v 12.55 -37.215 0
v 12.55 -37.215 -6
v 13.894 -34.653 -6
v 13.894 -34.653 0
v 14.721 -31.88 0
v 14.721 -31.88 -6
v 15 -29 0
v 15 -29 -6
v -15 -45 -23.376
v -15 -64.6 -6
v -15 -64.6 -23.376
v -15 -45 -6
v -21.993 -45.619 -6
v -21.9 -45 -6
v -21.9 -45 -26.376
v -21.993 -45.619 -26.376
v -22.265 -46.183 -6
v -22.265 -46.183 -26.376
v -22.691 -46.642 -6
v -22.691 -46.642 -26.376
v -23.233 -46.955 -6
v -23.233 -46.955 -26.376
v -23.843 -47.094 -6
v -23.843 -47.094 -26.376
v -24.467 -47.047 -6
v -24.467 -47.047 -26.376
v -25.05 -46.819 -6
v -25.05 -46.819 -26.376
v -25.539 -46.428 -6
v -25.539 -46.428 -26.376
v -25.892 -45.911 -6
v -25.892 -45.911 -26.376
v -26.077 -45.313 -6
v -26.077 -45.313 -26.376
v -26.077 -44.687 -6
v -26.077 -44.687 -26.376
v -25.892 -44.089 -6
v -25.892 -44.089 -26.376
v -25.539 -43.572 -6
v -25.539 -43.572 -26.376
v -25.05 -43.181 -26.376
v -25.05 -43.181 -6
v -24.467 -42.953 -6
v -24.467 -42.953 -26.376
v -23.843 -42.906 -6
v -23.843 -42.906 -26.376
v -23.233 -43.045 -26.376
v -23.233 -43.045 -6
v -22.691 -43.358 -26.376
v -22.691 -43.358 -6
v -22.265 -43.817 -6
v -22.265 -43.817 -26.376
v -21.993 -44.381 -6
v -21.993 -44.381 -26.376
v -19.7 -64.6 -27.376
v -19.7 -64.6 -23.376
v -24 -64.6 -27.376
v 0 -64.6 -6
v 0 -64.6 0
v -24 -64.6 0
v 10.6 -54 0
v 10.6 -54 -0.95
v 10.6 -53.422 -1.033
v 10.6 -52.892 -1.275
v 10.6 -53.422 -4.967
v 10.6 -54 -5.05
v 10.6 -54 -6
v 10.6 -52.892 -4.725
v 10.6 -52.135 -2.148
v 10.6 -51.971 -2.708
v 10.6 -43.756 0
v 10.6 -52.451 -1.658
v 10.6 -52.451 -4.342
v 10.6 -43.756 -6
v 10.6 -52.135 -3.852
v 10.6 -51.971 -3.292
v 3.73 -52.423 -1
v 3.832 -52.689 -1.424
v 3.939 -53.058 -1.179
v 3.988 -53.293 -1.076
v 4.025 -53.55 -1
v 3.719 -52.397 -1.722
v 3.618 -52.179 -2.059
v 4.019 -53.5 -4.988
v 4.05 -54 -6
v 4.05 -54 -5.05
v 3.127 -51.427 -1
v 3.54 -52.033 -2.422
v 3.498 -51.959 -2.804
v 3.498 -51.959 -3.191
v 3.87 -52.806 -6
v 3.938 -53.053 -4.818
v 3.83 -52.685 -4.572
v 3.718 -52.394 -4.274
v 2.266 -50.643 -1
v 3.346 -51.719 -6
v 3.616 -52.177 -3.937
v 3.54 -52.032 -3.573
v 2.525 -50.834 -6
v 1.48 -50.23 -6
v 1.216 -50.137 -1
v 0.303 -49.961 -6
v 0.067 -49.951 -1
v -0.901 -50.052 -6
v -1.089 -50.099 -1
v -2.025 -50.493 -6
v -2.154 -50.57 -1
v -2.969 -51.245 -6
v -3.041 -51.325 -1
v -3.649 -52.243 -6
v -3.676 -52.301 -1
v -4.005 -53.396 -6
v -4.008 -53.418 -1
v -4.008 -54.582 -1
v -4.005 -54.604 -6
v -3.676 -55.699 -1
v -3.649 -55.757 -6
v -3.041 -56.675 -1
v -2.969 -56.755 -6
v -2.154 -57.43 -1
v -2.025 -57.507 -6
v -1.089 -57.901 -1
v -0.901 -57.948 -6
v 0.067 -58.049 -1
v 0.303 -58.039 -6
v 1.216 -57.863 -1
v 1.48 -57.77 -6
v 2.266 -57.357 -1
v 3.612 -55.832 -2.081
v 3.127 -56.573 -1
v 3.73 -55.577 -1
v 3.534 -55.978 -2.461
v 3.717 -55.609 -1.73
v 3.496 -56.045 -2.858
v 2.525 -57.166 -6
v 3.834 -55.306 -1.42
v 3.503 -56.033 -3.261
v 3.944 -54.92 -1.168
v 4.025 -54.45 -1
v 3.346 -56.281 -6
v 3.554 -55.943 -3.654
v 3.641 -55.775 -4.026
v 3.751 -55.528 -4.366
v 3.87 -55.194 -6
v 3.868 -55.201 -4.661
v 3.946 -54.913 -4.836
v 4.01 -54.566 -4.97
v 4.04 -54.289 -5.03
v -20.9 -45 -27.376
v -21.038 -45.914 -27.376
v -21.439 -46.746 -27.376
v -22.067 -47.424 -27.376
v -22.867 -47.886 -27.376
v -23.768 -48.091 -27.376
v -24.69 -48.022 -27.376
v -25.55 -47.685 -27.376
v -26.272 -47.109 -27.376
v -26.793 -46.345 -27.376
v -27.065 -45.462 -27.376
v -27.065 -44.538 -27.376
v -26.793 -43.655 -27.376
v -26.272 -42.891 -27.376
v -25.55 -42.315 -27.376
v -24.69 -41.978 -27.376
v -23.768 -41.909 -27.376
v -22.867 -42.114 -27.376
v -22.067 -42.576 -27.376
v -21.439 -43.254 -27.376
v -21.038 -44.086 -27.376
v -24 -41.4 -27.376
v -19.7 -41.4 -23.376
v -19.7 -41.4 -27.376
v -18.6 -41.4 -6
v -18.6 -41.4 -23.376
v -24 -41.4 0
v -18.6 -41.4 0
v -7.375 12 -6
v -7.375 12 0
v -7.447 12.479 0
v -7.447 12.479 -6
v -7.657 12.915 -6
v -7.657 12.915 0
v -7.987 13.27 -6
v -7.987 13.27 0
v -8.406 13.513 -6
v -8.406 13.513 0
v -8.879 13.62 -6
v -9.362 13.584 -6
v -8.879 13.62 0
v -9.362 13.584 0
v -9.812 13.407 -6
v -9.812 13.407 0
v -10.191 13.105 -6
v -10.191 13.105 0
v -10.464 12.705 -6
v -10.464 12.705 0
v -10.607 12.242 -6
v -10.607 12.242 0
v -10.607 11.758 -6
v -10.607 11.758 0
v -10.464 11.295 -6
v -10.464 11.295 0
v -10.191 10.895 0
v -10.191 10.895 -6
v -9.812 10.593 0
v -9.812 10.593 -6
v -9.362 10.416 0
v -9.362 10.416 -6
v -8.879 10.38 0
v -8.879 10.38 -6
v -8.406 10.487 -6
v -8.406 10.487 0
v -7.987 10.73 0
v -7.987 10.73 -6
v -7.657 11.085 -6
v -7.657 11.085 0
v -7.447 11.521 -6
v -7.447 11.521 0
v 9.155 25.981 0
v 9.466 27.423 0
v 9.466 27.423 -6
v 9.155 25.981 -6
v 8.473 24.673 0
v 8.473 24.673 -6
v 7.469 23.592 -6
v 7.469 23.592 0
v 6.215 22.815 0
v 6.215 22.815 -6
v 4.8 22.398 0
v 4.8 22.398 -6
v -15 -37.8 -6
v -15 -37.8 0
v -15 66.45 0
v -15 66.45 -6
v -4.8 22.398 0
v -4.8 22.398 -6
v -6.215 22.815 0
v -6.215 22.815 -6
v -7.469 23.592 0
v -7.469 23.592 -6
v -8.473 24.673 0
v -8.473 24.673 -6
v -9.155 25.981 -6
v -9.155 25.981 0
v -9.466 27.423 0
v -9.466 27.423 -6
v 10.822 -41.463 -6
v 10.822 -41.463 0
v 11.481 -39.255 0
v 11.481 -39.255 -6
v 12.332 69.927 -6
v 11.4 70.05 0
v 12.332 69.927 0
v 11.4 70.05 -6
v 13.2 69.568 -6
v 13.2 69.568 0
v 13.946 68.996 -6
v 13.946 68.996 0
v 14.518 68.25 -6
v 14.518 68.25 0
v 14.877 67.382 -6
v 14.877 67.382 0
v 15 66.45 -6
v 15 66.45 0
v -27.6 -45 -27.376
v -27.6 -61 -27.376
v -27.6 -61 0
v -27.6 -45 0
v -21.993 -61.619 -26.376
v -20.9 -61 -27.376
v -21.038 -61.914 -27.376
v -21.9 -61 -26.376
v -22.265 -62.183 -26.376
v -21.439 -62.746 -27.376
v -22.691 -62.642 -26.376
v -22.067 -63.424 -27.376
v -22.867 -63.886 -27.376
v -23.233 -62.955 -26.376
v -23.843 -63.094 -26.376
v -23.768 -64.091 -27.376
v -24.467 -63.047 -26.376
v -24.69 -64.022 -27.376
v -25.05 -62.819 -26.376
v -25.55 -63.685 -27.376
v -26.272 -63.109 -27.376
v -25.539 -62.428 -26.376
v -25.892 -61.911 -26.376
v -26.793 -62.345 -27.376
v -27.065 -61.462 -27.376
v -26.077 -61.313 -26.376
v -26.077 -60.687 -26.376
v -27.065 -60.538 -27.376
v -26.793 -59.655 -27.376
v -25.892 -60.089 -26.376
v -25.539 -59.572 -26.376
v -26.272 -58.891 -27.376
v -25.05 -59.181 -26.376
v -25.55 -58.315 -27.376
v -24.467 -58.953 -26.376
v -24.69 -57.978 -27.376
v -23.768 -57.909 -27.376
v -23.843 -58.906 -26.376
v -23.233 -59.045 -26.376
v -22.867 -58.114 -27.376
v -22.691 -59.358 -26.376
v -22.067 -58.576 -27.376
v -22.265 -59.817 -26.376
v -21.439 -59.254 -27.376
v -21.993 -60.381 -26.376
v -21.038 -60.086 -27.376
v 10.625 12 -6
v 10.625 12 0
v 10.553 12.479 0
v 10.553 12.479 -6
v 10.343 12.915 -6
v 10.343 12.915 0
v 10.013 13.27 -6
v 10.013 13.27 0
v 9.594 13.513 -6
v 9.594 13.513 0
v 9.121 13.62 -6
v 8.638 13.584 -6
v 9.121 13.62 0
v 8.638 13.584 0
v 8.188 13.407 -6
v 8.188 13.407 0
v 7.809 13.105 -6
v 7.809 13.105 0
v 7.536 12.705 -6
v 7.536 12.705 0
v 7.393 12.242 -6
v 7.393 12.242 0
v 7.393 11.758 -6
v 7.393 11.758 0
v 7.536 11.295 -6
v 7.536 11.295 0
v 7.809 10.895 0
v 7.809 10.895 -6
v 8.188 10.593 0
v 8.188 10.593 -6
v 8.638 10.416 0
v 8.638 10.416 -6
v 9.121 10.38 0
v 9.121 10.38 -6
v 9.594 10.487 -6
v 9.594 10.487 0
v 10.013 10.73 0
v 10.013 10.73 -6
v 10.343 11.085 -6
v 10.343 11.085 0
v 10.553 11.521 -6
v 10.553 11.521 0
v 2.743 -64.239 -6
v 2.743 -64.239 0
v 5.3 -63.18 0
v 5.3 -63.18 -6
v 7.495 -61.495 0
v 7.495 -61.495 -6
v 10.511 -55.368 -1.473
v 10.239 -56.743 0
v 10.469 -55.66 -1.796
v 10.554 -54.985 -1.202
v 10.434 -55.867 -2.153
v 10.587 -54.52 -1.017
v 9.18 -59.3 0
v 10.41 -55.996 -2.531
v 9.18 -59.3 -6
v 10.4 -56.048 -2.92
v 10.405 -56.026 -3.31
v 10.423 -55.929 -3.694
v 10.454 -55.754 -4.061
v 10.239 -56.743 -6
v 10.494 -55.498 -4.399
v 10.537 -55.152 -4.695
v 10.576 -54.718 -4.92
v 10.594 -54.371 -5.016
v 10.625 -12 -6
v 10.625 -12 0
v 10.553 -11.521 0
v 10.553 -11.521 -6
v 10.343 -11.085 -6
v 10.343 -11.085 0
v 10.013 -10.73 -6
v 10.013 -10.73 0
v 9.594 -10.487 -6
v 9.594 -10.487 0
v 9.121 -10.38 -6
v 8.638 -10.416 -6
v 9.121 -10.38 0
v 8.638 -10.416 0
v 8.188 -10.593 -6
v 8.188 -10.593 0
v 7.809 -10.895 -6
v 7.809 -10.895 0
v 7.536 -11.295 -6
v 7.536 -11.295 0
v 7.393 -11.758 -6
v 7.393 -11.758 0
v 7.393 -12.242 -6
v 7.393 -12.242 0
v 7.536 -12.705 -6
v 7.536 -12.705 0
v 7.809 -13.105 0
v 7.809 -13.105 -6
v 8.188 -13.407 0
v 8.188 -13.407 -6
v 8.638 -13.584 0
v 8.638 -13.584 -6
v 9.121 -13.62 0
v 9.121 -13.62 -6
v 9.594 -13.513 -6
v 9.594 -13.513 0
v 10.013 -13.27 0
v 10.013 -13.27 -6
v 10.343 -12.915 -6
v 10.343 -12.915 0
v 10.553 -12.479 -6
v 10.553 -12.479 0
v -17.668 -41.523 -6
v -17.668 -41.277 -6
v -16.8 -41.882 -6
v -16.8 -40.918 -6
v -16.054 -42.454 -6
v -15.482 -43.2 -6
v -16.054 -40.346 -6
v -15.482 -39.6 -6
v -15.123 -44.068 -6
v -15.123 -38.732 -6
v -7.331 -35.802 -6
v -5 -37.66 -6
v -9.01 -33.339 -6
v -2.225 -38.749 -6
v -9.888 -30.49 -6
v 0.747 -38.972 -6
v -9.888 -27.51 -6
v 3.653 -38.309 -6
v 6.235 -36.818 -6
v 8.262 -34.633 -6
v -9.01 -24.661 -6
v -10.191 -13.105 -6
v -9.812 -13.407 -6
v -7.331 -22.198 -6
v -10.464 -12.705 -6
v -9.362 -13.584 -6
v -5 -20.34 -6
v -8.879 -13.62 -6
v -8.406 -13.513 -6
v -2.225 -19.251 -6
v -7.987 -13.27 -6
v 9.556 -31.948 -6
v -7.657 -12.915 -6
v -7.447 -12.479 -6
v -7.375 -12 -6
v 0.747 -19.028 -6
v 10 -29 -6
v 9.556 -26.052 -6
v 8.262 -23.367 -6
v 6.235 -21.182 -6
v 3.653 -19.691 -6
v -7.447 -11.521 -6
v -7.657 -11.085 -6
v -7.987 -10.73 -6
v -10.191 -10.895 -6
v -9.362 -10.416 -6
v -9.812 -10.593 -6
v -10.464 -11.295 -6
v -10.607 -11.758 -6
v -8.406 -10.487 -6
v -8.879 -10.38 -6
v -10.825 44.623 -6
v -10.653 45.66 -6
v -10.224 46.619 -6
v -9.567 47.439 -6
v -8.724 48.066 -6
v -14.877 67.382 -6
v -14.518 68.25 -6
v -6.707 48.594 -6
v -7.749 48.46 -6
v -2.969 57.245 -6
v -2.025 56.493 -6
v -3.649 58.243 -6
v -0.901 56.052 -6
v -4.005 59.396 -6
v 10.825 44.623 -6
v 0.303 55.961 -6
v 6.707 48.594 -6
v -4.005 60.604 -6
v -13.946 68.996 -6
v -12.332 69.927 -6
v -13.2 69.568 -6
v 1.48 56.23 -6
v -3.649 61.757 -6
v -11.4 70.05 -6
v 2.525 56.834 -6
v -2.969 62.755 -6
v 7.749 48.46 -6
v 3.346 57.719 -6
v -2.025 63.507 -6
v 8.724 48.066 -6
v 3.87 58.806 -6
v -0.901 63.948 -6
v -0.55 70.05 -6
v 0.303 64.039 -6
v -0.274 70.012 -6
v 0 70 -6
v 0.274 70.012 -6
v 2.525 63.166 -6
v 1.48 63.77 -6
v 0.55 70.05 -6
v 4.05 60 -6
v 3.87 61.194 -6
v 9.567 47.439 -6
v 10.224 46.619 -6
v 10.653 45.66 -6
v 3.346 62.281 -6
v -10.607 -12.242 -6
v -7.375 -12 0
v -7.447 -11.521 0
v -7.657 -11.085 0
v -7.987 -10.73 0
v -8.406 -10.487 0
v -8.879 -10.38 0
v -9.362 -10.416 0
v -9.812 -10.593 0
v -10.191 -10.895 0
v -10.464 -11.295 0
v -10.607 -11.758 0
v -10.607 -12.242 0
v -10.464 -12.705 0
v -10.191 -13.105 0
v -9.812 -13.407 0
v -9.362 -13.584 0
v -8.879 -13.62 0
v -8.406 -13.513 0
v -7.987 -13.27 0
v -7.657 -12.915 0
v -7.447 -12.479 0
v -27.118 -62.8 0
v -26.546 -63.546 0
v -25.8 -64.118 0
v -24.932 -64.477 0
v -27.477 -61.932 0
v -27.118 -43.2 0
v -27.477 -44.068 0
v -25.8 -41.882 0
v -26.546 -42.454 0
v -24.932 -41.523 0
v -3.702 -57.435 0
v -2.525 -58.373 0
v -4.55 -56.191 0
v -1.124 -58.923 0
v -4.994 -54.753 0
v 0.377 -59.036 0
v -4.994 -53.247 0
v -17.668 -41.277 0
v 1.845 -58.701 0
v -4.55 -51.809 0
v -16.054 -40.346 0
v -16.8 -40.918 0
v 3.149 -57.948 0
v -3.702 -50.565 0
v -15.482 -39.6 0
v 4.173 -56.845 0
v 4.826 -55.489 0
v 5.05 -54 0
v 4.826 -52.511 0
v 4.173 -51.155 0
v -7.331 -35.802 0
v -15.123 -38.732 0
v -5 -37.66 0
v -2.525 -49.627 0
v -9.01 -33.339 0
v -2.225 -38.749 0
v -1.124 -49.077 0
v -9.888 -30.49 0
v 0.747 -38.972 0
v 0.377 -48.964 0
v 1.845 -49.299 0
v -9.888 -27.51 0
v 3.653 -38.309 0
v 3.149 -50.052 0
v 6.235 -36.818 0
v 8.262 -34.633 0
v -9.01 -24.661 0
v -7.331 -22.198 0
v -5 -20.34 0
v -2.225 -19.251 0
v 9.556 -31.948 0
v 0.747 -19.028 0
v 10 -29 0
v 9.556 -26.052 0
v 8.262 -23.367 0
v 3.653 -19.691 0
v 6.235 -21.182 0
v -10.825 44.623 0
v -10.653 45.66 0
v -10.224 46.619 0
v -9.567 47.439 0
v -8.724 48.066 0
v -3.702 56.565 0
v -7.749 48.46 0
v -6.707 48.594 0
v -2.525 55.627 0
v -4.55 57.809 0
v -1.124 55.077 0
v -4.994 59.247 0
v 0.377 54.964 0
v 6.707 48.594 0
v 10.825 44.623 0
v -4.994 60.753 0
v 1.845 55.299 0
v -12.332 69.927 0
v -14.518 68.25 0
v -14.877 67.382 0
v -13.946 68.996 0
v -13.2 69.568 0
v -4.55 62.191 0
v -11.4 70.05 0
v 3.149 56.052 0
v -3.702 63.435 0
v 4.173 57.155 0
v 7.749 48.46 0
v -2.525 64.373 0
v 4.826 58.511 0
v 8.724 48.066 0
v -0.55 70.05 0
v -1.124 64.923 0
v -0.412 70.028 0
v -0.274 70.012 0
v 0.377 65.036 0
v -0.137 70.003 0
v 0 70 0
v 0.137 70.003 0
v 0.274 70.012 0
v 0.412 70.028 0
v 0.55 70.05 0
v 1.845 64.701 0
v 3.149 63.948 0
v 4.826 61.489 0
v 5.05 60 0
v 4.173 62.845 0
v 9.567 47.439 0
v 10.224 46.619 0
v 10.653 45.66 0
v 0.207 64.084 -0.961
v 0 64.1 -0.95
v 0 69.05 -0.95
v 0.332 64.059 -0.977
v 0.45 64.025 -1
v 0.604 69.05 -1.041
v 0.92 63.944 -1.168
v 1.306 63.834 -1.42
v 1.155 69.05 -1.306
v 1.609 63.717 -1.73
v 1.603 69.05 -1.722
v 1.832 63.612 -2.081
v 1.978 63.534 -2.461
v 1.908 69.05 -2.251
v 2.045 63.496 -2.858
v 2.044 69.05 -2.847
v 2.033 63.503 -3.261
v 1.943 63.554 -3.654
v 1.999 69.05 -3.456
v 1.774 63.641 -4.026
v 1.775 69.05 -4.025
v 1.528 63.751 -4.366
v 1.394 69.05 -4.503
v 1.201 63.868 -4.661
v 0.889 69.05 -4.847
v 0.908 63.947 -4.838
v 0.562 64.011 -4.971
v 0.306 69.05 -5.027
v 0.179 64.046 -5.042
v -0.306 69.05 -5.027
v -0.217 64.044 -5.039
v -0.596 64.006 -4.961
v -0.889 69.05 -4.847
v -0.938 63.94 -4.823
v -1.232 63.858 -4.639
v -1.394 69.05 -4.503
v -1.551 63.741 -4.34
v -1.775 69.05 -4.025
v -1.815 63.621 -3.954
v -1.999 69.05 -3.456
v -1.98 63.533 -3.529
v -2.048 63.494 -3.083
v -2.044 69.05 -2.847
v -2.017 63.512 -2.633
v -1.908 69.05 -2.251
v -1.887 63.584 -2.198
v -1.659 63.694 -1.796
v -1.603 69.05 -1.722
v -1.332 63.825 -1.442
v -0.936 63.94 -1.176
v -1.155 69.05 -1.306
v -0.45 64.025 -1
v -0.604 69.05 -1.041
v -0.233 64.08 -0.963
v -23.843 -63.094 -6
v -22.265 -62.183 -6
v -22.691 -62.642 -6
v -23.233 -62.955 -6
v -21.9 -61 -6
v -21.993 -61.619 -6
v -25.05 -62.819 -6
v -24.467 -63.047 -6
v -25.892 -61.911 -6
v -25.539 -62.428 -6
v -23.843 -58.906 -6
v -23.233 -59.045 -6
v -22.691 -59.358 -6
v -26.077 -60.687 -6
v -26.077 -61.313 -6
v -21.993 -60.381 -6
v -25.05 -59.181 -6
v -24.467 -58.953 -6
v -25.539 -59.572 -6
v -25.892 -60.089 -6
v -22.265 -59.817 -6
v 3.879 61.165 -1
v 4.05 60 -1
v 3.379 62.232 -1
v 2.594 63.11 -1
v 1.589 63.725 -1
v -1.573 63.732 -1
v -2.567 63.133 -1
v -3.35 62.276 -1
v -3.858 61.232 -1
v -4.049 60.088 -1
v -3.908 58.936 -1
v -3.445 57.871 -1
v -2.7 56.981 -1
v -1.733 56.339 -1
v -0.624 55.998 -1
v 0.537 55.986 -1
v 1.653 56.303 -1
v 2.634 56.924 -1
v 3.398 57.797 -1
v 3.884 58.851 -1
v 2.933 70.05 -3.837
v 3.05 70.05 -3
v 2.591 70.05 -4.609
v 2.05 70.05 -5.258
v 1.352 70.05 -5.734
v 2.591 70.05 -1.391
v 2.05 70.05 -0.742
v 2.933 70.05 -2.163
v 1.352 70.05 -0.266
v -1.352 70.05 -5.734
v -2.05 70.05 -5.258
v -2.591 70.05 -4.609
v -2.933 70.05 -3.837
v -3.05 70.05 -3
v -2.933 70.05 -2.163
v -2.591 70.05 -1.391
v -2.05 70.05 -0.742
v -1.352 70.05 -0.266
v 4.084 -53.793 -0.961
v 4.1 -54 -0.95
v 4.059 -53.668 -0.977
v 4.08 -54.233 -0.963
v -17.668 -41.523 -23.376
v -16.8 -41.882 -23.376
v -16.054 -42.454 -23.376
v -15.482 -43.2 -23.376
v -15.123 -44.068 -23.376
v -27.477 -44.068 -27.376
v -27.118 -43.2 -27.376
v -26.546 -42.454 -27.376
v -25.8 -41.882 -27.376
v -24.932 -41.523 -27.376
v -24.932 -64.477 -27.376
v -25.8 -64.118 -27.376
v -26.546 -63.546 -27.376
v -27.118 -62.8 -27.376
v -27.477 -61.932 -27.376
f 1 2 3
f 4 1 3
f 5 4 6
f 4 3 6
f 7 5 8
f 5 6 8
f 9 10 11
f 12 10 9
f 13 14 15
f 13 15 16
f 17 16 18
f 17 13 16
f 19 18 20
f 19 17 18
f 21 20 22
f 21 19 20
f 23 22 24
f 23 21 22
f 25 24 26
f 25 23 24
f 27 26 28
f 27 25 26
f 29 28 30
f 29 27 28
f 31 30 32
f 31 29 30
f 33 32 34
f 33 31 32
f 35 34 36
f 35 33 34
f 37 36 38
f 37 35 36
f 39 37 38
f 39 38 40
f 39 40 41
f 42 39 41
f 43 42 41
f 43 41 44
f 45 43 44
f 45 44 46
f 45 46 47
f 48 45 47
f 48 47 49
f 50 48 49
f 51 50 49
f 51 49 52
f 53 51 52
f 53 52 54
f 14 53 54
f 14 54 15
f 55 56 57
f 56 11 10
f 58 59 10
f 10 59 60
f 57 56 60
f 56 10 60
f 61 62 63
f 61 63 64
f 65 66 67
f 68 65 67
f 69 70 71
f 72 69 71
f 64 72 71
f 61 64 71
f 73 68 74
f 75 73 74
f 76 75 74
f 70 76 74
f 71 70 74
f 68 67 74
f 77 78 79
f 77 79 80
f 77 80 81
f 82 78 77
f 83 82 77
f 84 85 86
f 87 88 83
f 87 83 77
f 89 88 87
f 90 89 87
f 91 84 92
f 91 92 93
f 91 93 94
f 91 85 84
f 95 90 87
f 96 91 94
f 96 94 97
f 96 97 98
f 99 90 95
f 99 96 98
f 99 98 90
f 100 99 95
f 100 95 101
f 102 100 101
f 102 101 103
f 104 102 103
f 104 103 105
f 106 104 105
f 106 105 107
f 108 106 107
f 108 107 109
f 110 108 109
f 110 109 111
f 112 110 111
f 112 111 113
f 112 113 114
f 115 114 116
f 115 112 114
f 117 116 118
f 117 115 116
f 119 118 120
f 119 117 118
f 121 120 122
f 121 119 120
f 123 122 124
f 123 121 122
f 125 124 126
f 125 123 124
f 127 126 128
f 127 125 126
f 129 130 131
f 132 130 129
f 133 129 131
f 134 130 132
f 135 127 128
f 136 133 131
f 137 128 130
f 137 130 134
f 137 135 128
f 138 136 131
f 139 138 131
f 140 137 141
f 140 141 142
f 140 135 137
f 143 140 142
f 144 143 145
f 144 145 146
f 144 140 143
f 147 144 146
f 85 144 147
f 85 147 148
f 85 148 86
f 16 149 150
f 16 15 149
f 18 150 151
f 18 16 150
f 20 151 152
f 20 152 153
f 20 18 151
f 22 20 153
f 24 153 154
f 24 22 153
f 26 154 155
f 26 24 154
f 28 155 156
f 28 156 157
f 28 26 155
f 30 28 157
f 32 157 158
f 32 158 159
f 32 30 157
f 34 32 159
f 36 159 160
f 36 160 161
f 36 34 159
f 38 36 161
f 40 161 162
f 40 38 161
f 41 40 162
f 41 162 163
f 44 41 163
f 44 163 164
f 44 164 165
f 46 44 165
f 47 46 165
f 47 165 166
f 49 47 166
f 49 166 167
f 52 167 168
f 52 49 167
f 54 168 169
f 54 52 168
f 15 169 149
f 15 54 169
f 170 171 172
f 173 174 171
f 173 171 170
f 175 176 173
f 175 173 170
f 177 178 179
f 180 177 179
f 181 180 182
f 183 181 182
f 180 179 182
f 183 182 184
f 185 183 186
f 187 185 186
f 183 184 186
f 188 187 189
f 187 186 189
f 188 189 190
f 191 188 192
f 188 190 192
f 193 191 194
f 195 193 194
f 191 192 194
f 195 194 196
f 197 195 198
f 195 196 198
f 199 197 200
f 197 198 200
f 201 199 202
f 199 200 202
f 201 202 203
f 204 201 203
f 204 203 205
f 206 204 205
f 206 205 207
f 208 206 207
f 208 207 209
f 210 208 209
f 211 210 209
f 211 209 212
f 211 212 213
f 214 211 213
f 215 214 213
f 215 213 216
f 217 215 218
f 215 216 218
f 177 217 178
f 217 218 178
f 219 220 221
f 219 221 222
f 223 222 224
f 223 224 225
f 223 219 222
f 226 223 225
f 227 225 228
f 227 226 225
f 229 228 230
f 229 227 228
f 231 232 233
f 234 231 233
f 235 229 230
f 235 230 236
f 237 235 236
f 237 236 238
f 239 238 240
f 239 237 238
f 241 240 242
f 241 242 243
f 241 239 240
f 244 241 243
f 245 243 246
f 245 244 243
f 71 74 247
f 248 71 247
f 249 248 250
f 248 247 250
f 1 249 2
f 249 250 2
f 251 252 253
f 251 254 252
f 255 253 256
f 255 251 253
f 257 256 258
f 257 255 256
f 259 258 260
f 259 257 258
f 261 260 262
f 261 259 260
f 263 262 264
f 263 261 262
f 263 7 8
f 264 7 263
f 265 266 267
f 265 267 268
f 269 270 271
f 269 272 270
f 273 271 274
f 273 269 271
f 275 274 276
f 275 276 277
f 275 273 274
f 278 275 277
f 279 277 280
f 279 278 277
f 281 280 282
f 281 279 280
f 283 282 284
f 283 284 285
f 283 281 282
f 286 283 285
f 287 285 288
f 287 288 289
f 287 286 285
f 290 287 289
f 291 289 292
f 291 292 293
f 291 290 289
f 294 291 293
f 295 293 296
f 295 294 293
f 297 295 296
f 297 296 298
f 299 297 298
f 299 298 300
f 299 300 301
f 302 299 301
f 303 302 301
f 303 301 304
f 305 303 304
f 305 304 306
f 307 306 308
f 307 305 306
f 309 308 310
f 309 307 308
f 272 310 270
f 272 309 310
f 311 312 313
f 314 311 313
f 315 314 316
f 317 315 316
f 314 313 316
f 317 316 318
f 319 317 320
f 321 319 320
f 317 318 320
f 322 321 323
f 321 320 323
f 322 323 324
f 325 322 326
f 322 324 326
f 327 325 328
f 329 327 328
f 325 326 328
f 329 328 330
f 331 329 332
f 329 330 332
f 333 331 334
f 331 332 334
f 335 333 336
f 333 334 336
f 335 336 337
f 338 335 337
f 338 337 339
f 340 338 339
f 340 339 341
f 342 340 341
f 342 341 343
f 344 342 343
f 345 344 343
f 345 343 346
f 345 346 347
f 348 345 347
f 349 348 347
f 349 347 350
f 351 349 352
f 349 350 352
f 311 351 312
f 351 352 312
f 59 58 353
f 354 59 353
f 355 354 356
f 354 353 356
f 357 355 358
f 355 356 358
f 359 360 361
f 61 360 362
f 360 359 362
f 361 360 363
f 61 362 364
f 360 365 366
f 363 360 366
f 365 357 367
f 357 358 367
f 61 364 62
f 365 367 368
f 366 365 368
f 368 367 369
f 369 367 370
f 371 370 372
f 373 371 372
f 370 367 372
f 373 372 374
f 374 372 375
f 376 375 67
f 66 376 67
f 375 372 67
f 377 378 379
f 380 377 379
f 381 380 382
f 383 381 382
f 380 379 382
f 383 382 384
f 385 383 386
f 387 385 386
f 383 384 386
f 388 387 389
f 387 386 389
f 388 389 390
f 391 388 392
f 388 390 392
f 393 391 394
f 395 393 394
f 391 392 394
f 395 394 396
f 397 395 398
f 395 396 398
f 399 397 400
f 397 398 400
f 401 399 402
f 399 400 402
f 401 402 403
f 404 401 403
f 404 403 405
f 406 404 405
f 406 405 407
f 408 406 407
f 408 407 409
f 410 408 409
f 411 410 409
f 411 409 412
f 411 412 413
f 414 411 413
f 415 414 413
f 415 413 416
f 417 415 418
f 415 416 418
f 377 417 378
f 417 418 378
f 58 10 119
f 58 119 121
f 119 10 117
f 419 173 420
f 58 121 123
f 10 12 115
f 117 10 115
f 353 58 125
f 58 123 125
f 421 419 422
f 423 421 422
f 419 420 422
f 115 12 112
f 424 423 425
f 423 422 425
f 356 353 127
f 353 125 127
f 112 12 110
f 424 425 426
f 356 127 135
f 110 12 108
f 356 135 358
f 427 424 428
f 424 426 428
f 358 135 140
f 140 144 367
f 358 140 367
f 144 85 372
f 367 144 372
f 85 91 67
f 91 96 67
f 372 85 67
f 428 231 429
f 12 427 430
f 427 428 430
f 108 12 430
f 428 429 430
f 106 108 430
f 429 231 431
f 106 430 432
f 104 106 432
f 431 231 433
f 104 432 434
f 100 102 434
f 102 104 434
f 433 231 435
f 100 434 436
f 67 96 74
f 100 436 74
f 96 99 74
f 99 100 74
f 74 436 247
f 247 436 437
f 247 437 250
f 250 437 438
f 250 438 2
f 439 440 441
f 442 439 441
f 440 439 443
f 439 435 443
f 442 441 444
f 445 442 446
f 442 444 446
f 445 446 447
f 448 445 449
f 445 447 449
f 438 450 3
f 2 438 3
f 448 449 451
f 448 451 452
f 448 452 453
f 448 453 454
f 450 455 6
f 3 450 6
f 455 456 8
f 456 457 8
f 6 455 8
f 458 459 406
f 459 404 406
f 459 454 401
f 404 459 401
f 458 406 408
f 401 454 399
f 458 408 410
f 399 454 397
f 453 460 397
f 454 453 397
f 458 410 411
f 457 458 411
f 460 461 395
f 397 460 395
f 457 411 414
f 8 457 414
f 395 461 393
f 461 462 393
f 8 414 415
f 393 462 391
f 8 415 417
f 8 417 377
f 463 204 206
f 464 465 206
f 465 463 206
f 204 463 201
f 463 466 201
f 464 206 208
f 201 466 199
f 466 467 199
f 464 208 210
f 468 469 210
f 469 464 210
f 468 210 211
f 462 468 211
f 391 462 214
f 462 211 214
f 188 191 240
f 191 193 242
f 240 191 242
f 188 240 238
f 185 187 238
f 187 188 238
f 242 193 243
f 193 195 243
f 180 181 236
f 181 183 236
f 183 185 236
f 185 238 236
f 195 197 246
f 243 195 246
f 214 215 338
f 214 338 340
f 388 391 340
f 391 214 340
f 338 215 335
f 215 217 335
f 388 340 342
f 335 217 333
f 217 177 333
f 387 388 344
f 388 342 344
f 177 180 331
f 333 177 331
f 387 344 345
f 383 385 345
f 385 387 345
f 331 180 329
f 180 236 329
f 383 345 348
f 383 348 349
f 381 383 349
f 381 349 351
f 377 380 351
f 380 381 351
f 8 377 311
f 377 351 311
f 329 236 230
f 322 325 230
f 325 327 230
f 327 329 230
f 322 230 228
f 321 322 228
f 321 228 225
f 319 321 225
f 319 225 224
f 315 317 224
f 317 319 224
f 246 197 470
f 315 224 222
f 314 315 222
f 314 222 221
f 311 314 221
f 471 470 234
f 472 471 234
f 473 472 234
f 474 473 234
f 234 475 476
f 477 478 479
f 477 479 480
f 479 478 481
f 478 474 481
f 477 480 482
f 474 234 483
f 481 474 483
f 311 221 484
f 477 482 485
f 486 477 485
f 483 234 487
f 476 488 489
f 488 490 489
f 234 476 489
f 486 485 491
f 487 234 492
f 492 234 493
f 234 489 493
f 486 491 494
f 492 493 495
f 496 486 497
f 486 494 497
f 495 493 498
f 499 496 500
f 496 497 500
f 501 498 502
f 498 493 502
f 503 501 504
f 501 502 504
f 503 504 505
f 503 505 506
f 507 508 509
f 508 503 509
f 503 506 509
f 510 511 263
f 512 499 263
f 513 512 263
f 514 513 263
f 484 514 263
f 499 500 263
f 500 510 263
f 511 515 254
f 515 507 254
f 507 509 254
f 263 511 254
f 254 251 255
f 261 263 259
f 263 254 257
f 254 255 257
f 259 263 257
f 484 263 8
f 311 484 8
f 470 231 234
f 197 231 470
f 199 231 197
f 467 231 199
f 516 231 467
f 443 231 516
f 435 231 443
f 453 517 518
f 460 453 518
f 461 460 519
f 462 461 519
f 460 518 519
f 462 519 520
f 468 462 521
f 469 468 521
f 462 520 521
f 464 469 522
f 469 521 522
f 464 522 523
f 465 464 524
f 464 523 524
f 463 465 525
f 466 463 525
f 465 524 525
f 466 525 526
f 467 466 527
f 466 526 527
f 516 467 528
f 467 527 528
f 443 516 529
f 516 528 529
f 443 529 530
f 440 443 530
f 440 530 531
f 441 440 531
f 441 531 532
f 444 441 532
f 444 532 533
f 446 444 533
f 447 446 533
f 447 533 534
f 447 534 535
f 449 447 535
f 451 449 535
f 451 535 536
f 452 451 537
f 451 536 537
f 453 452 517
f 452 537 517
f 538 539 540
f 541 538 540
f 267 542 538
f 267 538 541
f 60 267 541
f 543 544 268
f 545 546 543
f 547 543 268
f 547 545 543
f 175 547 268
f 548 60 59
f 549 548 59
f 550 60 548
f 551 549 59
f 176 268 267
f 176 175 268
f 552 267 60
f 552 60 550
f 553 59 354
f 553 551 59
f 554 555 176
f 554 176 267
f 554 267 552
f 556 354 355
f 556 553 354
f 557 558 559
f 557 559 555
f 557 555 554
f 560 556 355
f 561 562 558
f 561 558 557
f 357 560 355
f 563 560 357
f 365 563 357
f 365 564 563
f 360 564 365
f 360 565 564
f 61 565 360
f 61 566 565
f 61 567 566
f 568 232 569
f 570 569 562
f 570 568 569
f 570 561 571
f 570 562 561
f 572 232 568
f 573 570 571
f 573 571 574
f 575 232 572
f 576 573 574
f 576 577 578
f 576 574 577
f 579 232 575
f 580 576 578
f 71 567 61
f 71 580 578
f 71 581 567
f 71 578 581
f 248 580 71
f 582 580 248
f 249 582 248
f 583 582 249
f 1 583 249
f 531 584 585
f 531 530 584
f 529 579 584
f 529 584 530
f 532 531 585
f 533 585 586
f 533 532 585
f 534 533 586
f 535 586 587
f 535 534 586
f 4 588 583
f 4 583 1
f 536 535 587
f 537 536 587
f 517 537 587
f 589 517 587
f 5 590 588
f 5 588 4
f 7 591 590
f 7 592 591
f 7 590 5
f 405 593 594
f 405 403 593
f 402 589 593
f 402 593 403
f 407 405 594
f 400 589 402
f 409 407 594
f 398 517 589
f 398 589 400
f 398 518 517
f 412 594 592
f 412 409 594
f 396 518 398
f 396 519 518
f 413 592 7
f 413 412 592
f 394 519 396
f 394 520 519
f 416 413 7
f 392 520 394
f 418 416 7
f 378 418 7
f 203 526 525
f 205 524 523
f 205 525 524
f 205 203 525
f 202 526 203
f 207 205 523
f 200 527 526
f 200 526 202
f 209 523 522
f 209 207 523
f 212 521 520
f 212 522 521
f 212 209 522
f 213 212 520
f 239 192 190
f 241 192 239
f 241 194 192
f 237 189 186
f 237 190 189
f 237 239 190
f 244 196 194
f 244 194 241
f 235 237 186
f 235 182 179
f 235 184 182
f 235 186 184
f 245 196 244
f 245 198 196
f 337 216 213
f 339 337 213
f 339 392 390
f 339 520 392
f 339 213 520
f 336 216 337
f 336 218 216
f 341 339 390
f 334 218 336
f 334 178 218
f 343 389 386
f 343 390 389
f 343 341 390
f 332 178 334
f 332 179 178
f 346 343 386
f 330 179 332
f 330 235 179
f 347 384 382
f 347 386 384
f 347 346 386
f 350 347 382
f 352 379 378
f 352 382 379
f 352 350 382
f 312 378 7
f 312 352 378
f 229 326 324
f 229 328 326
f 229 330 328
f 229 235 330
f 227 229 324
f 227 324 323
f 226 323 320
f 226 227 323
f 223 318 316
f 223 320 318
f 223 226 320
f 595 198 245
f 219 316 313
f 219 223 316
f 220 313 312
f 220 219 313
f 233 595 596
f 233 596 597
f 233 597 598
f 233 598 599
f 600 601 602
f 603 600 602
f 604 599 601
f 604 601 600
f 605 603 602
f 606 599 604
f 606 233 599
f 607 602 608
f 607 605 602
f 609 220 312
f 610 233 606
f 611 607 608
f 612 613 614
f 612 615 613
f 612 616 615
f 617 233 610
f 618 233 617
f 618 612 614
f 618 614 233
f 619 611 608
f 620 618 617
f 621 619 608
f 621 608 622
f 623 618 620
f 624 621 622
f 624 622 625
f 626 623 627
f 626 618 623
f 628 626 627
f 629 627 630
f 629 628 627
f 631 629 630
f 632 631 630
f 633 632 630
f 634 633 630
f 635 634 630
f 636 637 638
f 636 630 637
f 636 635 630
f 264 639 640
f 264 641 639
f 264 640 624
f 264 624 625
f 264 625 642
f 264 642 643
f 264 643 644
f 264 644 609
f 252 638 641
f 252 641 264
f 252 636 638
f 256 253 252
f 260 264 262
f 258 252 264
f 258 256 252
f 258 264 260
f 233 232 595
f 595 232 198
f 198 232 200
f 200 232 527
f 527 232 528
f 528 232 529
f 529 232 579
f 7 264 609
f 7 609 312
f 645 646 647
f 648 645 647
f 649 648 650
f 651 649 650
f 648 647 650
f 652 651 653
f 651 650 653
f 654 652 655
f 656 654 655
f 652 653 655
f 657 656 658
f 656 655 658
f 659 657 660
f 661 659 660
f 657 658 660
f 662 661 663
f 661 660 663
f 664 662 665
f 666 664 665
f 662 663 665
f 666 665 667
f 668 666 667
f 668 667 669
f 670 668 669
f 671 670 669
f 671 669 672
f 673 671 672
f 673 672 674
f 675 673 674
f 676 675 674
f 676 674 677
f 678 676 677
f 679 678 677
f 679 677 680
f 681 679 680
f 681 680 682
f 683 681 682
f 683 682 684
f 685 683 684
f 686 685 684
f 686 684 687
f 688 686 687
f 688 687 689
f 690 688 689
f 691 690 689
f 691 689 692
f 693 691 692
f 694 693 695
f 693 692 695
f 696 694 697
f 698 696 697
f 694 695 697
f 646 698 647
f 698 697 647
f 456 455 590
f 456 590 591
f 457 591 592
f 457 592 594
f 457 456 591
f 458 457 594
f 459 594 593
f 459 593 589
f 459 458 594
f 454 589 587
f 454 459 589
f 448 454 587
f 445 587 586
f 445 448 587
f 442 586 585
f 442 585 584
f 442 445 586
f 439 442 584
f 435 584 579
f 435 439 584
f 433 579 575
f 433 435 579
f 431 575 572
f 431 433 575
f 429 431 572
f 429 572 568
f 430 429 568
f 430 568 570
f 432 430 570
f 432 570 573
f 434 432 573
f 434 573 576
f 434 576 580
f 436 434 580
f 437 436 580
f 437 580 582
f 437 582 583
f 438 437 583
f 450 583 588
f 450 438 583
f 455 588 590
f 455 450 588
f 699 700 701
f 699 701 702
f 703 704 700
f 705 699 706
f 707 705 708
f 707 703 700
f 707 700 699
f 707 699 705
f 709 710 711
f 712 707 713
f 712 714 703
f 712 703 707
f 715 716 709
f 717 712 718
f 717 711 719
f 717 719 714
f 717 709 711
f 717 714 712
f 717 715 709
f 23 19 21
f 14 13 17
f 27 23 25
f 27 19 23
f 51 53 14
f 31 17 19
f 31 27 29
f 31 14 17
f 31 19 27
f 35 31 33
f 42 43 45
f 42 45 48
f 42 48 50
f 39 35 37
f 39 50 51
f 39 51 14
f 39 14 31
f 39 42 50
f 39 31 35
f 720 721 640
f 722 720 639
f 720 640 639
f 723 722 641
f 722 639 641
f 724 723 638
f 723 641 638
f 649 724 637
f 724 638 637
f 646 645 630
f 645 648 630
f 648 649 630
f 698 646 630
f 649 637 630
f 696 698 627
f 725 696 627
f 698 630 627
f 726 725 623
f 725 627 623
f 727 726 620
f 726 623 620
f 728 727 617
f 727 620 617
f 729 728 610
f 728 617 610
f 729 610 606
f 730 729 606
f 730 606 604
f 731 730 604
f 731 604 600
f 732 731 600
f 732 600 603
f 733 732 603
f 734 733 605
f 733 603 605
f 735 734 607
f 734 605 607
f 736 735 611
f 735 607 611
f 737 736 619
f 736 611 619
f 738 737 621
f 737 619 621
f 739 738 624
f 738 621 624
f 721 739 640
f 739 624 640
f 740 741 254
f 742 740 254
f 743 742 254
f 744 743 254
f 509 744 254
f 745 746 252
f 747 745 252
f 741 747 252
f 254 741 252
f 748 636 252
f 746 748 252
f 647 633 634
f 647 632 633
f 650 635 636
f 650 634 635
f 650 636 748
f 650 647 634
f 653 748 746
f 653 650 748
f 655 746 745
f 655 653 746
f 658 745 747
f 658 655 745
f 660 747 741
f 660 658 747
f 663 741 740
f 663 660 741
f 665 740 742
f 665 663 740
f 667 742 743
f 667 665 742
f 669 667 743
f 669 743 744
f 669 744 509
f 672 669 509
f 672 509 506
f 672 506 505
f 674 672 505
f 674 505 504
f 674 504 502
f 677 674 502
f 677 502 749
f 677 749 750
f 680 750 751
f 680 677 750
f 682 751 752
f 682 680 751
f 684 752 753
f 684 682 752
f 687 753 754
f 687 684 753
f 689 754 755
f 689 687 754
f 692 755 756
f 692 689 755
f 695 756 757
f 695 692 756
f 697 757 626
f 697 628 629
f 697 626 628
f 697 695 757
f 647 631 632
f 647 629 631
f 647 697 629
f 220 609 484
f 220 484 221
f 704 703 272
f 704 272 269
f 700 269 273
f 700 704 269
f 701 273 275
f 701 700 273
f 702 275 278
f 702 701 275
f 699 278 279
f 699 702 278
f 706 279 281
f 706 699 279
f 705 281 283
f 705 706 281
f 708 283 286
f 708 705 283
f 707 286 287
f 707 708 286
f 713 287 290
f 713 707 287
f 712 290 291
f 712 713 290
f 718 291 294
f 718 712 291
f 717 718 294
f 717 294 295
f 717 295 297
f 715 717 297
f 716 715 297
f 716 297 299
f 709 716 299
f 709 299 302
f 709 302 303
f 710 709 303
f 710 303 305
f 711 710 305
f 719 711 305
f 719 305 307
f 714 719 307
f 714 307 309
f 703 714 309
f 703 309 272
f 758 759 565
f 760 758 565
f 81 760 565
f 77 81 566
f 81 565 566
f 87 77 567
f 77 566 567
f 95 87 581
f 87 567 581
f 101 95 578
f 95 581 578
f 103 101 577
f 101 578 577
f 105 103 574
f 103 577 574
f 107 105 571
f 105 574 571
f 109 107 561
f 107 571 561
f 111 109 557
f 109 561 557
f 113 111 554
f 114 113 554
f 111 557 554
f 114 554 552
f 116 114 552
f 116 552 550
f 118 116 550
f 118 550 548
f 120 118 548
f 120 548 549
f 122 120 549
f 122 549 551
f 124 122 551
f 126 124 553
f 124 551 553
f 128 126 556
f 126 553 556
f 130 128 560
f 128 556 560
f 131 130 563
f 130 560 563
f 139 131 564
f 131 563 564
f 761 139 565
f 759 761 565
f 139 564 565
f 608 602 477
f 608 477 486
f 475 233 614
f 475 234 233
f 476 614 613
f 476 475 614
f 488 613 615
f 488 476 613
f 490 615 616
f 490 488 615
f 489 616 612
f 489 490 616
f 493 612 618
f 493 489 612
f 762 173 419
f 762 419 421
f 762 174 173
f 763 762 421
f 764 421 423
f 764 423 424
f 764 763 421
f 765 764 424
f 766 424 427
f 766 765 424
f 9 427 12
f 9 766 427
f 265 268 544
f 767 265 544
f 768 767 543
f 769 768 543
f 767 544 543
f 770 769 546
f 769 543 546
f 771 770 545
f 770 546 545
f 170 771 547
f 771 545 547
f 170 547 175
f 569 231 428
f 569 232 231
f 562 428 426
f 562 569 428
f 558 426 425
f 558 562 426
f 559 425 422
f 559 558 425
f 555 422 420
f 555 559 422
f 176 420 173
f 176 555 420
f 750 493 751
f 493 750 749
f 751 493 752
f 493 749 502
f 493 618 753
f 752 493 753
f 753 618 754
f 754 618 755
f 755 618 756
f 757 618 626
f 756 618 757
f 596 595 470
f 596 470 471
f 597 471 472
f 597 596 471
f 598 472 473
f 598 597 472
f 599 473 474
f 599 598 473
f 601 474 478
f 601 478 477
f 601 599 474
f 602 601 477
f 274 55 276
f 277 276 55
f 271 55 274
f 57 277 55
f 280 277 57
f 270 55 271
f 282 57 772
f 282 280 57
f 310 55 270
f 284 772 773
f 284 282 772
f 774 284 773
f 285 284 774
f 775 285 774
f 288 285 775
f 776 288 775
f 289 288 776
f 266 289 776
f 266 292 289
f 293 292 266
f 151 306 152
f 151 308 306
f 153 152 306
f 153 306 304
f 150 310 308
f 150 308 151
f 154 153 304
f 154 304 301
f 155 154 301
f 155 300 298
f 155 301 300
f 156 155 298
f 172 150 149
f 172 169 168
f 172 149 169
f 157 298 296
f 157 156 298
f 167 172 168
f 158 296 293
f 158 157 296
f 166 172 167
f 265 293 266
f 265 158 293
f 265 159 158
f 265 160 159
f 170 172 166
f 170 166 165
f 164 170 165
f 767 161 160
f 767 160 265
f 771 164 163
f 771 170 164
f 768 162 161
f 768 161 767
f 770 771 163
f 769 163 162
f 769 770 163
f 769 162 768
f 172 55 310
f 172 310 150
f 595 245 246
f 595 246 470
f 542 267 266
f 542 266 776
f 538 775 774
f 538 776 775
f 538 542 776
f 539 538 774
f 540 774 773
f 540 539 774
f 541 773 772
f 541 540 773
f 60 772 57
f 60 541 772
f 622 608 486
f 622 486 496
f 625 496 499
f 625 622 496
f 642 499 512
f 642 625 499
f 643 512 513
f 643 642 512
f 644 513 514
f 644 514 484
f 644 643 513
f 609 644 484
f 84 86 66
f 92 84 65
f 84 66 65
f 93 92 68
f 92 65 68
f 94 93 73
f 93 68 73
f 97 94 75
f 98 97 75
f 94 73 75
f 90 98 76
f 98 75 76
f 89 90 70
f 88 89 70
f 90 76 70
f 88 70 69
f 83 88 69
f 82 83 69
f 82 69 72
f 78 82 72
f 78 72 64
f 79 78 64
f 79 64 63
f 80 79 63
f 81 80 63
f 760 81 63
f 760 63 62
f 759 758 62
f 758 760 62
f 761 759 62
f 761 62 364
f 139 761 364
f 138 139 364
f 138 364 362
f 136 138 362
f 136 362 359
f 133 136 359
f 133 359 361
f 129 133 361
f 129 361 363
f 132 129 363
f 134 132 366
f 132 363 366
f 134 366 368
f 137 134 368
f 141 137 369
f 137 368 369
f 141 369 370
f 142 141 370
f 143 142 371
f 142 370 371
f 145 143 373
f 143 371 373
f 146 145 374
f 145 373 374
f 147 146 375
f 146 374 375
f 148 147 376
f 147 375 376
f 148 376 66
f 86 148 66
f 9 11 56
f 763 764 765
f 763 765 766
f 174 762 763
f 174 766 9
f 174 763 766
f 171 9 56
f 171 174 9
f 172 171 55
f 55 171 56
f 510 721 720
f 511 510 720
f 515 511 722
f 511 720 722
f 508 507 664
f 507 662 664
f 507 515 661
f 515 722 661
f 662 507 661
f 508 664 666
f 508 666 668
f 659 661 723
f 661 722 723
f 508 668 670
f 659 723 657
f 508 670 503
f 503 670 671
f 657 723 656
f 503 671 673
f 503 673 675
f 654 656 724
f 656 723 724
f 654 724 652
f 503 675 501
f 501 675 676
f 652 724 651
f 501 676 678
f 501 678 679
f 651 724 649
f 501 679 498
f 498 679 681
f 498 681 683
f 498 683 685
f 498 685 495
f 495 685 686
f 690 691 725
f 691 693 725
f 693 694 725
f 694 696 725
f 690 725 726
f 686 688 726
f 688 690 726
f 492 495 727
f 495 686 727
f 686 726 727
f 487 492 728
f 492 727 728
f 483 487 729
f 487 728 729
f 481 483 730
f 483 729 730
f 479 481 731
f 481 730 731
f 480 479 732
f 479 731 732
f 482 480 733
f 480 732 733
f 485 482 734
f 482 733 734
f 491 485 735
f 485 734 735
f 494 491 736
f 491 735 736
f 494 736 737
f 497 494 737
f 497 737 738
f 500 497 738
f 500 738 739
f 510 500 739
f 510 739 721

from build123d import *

# Parameters (mm, degrees)
SKETCH1_W           = 30
SKETCH1_H           = 34
SKETCH1_R           = 1.625
BOSS_EXTRUDE1_DEPTH = 6
BOSS_EXTRUDE3_START = -6
SKETCH2_R           = 10
SKETCH2_R_2         = 4.05
BOSS_EXTRUDE3_DEPTH = 6
SKETCH3_R           = 2.1
BOSS_EXTRUDE4_DEPTH = 21.376405408
CUT_EXTRUDE1_START  = -10
CUT_EXTRUDE1_DEPTH  = 10
SKETCH5_W           = 4.7
SKETCH5_H           = 23.2
BOSS_EXTRUDE5_DEPTH = 17.376405408
CUT_EXTRUDE2_DEPTH  = 10
SKETCH8_R           = 2.05
CUT_EXTRUDE3_DEPTH  = 10
SKETCH9_W           = 30
SKETCH9_H           = 53.05
SKETCH9_R           = 4.05
BOSS_EXTRUDE6_DEPTH = 6
SKETCH10_R          = 2.05
CUT_EXTRUDE7_DEPTH  = 10
FILLET2_R           = 3.6
FILLET3_R           = 3.6
CHAMFER1_SIZE       = 1
CHAMFER2_SIZE       = 1


with BuildPart() as part:
    # Sketch1 → Boss-Extrude1 (new body)
    with BuildSketch(Plane.XY):
        Rectangle(SKETCH1_W, SKETCH1_H)
        with Locations((-9, 12)):
            Circle(SKETCH1_R, mode=Mode.SUBTRACT)
        with Locations((9, 12)):
            Circle(SKETCH1_R, mode=Mode.SUBTRACT)
        with Locations((-9, -12)):
            Circle(SKETCH1_R, mode=Mode.SUBTRACT)
        with Locations((9, -12)):
            Circle(SKETCH1_R, mode=Mode.SUBTRACT)
    extrude(amount=-BOSS_EXTRUDE1_DEPTH)

    # Sketch2 → Boss-Extrude3 (add)
    with BuildSketch(Plane.XY.offset(BOSS_EXTRUDE3_START)):
        Polygon((-15, -17), (15, -17), (15, -64.6), (-15, -64.6), (-27.6, -64.6), (-27.6, -41.4), (-15, -41.4), align=None)
        with Locations((0, -29)):
            Circle(SKETCH2_R, mode=Mode.SUBTRACT)
        with Locations((0, -54)):
            Circle(SKETCH2_R_2, mode=Mode.SUBTRACT)
    extrude(amount=BOSS_EXTRUDE3_DEPTH)

    # Sketch3 → Boss-Extrude4 (add)
    with BuildSketch(Plane(origin=(0, 0, -6), x_dir=(-1, 0, 0), z_dir=(0, 0, -1))):
        with BuildLine():
            Line((27.6, -61), (27.6, -45))
            ThreePointArc((27.6, -45), (26.545584412, -42.454415588), (24, -41.4))
            Line((24, -41.4), (19.7, -41.4))
            Line((19.7, -41.4), (19.7, -64.6))
            Line((19.7, -64.6), (24, -64.6))
            ThreePointArc((24, -64.6), (26.545584412, -63.545584412), (27.6, -61))
        make_face()
        with Locations(Location((24, -61, 0), (0, 0, 180))):
            Circle(SKETCH3_R, mode=Mode.SUBTRACT)
        with Locations(Location((24, -45, 0), (0, 0, 180))):
            Circle(SKETCH3_R, mode=Mode.SUBTRACT)
    extrude(amount=BOSS_EXTRUDE4_DEPTH)

    # Sketch4 → Cut-Extrude1 (cut)
    with BuildSketch(Plane(origin=(0, 0, -6), x_dir=(-1, 0, 0), z_dir=(0, 0, -1)).offset(CUT_EXTRUDE1_START)):
        with BuildLine():
            ThreePointArc((27.6, -61), (26.545584412, -63.545584412), (24, -64.6))
            Line((24, -64.6), (27.6, -64.6))
            Line((27.6, -64.6), (27.6, -61))
        make_face()
        with BuildLine():
            ThreePointArc((24, -41.4), (26.545584412, -42.454415588), (27.6, -45))
            Line((27.6, -45), (27.6, -41.4))
            Line((27.6, -41.4), (24, -41.4))
        make_face()
    extrude(amount=CUT_EXTRUDE1_DEPTH, mode=Mode.SUBTRACT)

    # Sketch5 → Boss-Extrude5 (add)
    with BuildSketch(Plane(origin=(0, 0, -6), x_dir=(-1, 0, 0), z_dir=(0, 0, -1))):
        with Locations((17.35, -53)):
            Rectangle(SKETCH5_W, SKETCH5_H)
    extrude(amount=BOSS_EXTRUDE5_DEPTH)

    # Sketch7 → Cut-Extrude2 (cut)
    with BuildSketch(Plane(origin=(0, 0, -6), x_dir=(-1, 0, 0), z_dir=(0, 0, -1))):
        with BuildLine():
            ThreePointArc((0, -64.6), (-7.495331881, -61.495331881), (-10.6, -54))
            Line((-10.6, -54), (-10.6, -43.756336497))
            ThreePointArc((-10.6, -43.756336497), (-11.098006621, -40.343327835), (-12.550498477, -37.214924709))
            ThreePointArc((-12.550498477, -37.214924709), (-14.374586553, -33.286170951), (-15, -29))
            Line((-15, -29), (-15, -64.6))
            Line((-15, -64.6), (0, -64.6))
        make_face()
    extrude(amount=-CUT_EXTRUDE2_DEPTH, mode=Mode.SUBTRACT)

    # Sketch8 → Cut-Extrude3 (cut)
    with BuildSketch(Plane(origin=(10.6, 0, 0), x_dir=(0, 0, -1), z_dir=(1, 0, 0))):
        with Locations((3, -54)):
            Circle(SKETCH8_R)
    extrude(amount=-CUT_EXTRUDE3_DEPTH, mode=Mode.SUBTRACT)

    # Sketch9 → Boss-Extrude6 (add)
    with BuildSketch(Plane.XY):
        with Locations((0, 43.525)):
            Rectangle(SKETCH9_W, SKETCH9_H)
        with Locations((0, 60)):
            Circle(SKETCH9_R, mode=Mode.SUBTRACT)
        with BuildLine():
            Line((-6.706665949, 48.593809049), (6.706665949, 48.593809049))
            ThreePointArc((6.706665949, 48.593809049), (9.567126212, 47.439316621), (10.824837954, 44.622714616))
            Line((10.824837954, 44.622714616), (9.466318981, 27.423327073))
            ThreePointArc((9.466318981, 27.423327073), (8.007195381, 24.098965988), (4.799877304, 22.397928344))
            Line((4.799877304, 22.397928344), (-4.799877304, 22.397928344))
            ThreePointArc((-4.799877304, 22.397928344), (-8.007195381, 24.098965988), (-9.466318981, 27.423327073))
            Line((-9.466318981, 27.423327073), (-10.824837954, 44.622714616))
            ThreePointArc((-10.824837954, 44.622714616), (-9.567126212, 47.439316621), (-6.706665949, 48.593809049))
        make_face(mode=Mode.SUBTRACT)
    extrude(amount=-BOSS_EXTRUDE6_DEPTH)

    # Sketch10 → Cut-Extrude7 (cut)
    with BuildSketch(Plane(origin=(0, 70.05, 0), x_dir=(1, 0, 0), z_dir=(0, 1, 0))):
        with Locations(Location((0, 3, 0), (0, 0, 270))):
            Circle(SKETCH10_R)
    extrude(amount=-CUT_EXTRUDE7_DEPTH, mode=Mode.SUBTRACT)

    # Fillet2
    fillet2_edges = [part.edges().sort_by_distance(p)[0] for p in [
        (15, 70.05, -3),
        (-15, 70.05, -3),
        (-15, -41.4, -3),
    ]]
    fillet(fillet2_edges, radius=FILLET2_R)

    # Fillet3
    fillet3_edges = [part.edges().sort_by_distance(p)[0] for p in [
        (-15, -41.4, -14.688202704),
    ]]
    fillet(fillet3_edges, radius=FILLET3_R)

    # Chamfer1
    # the kernel refuses this chamfer: 1 mm, written as the material it takes off along each edge
    with BuildSketch(Plane(origin=(0, 70.05, -3), x_dir=(0, 0, 1), z_dir=(-1, 0, 0))) as chamfer1_piece_1:
        Polygon((2.05 + CHAMFER1_SIZE, 0), (2.05, -CHAMFER1_SIZE), (2.05, 0), align=None)
    revolve(axis=Axis((0, 70.05, -3), (0, 1, 0)), mode=Mode.SUBTRACT)
    with BuildSketch(Plane(origin=(-24, -45, -27.376405408), x_dir=(1, 0, 0), z_dir=(0, 1, 0))) as chamfer1_piece_2:
        Polygon((2.1 + CHAMFER1_SIZE, 0), (2.1, -CHAMFER1_SIZE), (2.1, 0), align=None)
    revolve(axis=Axis((-24, -45, -27.376405408), (0, 0, -1)), mode=Mode.SUBTRACT)
    with BuildSketch(Plane(origin=(-24, -61, -27.376405408), x_dir=(1, 0, 0), z_dir=(0, 1, 0))) as chamfer1_piece_3:
        Polygon((2.1 + CHAMFER1_SIZE, 0), (2.1, -CHAMFER1_SIZE), (2.1, 0), align=None)
    revolve(axis=Axis((-24, -61, -27.376405408), (0, 0, -1)), mode=Mode.SUBTRACT)

    # Chamfer2
    # the kernel refuses this chamfer: 1 mm, written as the material it takes off along each edge
    with BuildSketch(Plane(origin=(0, -54, 0), x_dir=(1, 0, 0), z_dir=(0, -1, 0))) as chamfer2_piece_1:
        Polygon((4.05, -CHAMFER2_SIZE), (4.05 + CHAMFER2_SIZE, 0), (4.05, 0), align=None)
    revolve(axis=Axis((0, -54, 0), (0, 0, 1)), mode=Mode.SUBTRACT)
    with BuildSketch(Plane(origin=(0, 60, 0), x_dir=(1, 0, 0), z_dir=(0, -1, 0))) as chamfer2_piece_2:
        Polygon((4.05, -CHAMFER2_SIZE), (4.05 + CHAMFER2_SIZE, 0), (4.05, 0), align=None)
    revolve(axis=Axis((0, 60, 0), (0, 0, 1)), mode=Mode.SUBTRACT)


solid = part.part
